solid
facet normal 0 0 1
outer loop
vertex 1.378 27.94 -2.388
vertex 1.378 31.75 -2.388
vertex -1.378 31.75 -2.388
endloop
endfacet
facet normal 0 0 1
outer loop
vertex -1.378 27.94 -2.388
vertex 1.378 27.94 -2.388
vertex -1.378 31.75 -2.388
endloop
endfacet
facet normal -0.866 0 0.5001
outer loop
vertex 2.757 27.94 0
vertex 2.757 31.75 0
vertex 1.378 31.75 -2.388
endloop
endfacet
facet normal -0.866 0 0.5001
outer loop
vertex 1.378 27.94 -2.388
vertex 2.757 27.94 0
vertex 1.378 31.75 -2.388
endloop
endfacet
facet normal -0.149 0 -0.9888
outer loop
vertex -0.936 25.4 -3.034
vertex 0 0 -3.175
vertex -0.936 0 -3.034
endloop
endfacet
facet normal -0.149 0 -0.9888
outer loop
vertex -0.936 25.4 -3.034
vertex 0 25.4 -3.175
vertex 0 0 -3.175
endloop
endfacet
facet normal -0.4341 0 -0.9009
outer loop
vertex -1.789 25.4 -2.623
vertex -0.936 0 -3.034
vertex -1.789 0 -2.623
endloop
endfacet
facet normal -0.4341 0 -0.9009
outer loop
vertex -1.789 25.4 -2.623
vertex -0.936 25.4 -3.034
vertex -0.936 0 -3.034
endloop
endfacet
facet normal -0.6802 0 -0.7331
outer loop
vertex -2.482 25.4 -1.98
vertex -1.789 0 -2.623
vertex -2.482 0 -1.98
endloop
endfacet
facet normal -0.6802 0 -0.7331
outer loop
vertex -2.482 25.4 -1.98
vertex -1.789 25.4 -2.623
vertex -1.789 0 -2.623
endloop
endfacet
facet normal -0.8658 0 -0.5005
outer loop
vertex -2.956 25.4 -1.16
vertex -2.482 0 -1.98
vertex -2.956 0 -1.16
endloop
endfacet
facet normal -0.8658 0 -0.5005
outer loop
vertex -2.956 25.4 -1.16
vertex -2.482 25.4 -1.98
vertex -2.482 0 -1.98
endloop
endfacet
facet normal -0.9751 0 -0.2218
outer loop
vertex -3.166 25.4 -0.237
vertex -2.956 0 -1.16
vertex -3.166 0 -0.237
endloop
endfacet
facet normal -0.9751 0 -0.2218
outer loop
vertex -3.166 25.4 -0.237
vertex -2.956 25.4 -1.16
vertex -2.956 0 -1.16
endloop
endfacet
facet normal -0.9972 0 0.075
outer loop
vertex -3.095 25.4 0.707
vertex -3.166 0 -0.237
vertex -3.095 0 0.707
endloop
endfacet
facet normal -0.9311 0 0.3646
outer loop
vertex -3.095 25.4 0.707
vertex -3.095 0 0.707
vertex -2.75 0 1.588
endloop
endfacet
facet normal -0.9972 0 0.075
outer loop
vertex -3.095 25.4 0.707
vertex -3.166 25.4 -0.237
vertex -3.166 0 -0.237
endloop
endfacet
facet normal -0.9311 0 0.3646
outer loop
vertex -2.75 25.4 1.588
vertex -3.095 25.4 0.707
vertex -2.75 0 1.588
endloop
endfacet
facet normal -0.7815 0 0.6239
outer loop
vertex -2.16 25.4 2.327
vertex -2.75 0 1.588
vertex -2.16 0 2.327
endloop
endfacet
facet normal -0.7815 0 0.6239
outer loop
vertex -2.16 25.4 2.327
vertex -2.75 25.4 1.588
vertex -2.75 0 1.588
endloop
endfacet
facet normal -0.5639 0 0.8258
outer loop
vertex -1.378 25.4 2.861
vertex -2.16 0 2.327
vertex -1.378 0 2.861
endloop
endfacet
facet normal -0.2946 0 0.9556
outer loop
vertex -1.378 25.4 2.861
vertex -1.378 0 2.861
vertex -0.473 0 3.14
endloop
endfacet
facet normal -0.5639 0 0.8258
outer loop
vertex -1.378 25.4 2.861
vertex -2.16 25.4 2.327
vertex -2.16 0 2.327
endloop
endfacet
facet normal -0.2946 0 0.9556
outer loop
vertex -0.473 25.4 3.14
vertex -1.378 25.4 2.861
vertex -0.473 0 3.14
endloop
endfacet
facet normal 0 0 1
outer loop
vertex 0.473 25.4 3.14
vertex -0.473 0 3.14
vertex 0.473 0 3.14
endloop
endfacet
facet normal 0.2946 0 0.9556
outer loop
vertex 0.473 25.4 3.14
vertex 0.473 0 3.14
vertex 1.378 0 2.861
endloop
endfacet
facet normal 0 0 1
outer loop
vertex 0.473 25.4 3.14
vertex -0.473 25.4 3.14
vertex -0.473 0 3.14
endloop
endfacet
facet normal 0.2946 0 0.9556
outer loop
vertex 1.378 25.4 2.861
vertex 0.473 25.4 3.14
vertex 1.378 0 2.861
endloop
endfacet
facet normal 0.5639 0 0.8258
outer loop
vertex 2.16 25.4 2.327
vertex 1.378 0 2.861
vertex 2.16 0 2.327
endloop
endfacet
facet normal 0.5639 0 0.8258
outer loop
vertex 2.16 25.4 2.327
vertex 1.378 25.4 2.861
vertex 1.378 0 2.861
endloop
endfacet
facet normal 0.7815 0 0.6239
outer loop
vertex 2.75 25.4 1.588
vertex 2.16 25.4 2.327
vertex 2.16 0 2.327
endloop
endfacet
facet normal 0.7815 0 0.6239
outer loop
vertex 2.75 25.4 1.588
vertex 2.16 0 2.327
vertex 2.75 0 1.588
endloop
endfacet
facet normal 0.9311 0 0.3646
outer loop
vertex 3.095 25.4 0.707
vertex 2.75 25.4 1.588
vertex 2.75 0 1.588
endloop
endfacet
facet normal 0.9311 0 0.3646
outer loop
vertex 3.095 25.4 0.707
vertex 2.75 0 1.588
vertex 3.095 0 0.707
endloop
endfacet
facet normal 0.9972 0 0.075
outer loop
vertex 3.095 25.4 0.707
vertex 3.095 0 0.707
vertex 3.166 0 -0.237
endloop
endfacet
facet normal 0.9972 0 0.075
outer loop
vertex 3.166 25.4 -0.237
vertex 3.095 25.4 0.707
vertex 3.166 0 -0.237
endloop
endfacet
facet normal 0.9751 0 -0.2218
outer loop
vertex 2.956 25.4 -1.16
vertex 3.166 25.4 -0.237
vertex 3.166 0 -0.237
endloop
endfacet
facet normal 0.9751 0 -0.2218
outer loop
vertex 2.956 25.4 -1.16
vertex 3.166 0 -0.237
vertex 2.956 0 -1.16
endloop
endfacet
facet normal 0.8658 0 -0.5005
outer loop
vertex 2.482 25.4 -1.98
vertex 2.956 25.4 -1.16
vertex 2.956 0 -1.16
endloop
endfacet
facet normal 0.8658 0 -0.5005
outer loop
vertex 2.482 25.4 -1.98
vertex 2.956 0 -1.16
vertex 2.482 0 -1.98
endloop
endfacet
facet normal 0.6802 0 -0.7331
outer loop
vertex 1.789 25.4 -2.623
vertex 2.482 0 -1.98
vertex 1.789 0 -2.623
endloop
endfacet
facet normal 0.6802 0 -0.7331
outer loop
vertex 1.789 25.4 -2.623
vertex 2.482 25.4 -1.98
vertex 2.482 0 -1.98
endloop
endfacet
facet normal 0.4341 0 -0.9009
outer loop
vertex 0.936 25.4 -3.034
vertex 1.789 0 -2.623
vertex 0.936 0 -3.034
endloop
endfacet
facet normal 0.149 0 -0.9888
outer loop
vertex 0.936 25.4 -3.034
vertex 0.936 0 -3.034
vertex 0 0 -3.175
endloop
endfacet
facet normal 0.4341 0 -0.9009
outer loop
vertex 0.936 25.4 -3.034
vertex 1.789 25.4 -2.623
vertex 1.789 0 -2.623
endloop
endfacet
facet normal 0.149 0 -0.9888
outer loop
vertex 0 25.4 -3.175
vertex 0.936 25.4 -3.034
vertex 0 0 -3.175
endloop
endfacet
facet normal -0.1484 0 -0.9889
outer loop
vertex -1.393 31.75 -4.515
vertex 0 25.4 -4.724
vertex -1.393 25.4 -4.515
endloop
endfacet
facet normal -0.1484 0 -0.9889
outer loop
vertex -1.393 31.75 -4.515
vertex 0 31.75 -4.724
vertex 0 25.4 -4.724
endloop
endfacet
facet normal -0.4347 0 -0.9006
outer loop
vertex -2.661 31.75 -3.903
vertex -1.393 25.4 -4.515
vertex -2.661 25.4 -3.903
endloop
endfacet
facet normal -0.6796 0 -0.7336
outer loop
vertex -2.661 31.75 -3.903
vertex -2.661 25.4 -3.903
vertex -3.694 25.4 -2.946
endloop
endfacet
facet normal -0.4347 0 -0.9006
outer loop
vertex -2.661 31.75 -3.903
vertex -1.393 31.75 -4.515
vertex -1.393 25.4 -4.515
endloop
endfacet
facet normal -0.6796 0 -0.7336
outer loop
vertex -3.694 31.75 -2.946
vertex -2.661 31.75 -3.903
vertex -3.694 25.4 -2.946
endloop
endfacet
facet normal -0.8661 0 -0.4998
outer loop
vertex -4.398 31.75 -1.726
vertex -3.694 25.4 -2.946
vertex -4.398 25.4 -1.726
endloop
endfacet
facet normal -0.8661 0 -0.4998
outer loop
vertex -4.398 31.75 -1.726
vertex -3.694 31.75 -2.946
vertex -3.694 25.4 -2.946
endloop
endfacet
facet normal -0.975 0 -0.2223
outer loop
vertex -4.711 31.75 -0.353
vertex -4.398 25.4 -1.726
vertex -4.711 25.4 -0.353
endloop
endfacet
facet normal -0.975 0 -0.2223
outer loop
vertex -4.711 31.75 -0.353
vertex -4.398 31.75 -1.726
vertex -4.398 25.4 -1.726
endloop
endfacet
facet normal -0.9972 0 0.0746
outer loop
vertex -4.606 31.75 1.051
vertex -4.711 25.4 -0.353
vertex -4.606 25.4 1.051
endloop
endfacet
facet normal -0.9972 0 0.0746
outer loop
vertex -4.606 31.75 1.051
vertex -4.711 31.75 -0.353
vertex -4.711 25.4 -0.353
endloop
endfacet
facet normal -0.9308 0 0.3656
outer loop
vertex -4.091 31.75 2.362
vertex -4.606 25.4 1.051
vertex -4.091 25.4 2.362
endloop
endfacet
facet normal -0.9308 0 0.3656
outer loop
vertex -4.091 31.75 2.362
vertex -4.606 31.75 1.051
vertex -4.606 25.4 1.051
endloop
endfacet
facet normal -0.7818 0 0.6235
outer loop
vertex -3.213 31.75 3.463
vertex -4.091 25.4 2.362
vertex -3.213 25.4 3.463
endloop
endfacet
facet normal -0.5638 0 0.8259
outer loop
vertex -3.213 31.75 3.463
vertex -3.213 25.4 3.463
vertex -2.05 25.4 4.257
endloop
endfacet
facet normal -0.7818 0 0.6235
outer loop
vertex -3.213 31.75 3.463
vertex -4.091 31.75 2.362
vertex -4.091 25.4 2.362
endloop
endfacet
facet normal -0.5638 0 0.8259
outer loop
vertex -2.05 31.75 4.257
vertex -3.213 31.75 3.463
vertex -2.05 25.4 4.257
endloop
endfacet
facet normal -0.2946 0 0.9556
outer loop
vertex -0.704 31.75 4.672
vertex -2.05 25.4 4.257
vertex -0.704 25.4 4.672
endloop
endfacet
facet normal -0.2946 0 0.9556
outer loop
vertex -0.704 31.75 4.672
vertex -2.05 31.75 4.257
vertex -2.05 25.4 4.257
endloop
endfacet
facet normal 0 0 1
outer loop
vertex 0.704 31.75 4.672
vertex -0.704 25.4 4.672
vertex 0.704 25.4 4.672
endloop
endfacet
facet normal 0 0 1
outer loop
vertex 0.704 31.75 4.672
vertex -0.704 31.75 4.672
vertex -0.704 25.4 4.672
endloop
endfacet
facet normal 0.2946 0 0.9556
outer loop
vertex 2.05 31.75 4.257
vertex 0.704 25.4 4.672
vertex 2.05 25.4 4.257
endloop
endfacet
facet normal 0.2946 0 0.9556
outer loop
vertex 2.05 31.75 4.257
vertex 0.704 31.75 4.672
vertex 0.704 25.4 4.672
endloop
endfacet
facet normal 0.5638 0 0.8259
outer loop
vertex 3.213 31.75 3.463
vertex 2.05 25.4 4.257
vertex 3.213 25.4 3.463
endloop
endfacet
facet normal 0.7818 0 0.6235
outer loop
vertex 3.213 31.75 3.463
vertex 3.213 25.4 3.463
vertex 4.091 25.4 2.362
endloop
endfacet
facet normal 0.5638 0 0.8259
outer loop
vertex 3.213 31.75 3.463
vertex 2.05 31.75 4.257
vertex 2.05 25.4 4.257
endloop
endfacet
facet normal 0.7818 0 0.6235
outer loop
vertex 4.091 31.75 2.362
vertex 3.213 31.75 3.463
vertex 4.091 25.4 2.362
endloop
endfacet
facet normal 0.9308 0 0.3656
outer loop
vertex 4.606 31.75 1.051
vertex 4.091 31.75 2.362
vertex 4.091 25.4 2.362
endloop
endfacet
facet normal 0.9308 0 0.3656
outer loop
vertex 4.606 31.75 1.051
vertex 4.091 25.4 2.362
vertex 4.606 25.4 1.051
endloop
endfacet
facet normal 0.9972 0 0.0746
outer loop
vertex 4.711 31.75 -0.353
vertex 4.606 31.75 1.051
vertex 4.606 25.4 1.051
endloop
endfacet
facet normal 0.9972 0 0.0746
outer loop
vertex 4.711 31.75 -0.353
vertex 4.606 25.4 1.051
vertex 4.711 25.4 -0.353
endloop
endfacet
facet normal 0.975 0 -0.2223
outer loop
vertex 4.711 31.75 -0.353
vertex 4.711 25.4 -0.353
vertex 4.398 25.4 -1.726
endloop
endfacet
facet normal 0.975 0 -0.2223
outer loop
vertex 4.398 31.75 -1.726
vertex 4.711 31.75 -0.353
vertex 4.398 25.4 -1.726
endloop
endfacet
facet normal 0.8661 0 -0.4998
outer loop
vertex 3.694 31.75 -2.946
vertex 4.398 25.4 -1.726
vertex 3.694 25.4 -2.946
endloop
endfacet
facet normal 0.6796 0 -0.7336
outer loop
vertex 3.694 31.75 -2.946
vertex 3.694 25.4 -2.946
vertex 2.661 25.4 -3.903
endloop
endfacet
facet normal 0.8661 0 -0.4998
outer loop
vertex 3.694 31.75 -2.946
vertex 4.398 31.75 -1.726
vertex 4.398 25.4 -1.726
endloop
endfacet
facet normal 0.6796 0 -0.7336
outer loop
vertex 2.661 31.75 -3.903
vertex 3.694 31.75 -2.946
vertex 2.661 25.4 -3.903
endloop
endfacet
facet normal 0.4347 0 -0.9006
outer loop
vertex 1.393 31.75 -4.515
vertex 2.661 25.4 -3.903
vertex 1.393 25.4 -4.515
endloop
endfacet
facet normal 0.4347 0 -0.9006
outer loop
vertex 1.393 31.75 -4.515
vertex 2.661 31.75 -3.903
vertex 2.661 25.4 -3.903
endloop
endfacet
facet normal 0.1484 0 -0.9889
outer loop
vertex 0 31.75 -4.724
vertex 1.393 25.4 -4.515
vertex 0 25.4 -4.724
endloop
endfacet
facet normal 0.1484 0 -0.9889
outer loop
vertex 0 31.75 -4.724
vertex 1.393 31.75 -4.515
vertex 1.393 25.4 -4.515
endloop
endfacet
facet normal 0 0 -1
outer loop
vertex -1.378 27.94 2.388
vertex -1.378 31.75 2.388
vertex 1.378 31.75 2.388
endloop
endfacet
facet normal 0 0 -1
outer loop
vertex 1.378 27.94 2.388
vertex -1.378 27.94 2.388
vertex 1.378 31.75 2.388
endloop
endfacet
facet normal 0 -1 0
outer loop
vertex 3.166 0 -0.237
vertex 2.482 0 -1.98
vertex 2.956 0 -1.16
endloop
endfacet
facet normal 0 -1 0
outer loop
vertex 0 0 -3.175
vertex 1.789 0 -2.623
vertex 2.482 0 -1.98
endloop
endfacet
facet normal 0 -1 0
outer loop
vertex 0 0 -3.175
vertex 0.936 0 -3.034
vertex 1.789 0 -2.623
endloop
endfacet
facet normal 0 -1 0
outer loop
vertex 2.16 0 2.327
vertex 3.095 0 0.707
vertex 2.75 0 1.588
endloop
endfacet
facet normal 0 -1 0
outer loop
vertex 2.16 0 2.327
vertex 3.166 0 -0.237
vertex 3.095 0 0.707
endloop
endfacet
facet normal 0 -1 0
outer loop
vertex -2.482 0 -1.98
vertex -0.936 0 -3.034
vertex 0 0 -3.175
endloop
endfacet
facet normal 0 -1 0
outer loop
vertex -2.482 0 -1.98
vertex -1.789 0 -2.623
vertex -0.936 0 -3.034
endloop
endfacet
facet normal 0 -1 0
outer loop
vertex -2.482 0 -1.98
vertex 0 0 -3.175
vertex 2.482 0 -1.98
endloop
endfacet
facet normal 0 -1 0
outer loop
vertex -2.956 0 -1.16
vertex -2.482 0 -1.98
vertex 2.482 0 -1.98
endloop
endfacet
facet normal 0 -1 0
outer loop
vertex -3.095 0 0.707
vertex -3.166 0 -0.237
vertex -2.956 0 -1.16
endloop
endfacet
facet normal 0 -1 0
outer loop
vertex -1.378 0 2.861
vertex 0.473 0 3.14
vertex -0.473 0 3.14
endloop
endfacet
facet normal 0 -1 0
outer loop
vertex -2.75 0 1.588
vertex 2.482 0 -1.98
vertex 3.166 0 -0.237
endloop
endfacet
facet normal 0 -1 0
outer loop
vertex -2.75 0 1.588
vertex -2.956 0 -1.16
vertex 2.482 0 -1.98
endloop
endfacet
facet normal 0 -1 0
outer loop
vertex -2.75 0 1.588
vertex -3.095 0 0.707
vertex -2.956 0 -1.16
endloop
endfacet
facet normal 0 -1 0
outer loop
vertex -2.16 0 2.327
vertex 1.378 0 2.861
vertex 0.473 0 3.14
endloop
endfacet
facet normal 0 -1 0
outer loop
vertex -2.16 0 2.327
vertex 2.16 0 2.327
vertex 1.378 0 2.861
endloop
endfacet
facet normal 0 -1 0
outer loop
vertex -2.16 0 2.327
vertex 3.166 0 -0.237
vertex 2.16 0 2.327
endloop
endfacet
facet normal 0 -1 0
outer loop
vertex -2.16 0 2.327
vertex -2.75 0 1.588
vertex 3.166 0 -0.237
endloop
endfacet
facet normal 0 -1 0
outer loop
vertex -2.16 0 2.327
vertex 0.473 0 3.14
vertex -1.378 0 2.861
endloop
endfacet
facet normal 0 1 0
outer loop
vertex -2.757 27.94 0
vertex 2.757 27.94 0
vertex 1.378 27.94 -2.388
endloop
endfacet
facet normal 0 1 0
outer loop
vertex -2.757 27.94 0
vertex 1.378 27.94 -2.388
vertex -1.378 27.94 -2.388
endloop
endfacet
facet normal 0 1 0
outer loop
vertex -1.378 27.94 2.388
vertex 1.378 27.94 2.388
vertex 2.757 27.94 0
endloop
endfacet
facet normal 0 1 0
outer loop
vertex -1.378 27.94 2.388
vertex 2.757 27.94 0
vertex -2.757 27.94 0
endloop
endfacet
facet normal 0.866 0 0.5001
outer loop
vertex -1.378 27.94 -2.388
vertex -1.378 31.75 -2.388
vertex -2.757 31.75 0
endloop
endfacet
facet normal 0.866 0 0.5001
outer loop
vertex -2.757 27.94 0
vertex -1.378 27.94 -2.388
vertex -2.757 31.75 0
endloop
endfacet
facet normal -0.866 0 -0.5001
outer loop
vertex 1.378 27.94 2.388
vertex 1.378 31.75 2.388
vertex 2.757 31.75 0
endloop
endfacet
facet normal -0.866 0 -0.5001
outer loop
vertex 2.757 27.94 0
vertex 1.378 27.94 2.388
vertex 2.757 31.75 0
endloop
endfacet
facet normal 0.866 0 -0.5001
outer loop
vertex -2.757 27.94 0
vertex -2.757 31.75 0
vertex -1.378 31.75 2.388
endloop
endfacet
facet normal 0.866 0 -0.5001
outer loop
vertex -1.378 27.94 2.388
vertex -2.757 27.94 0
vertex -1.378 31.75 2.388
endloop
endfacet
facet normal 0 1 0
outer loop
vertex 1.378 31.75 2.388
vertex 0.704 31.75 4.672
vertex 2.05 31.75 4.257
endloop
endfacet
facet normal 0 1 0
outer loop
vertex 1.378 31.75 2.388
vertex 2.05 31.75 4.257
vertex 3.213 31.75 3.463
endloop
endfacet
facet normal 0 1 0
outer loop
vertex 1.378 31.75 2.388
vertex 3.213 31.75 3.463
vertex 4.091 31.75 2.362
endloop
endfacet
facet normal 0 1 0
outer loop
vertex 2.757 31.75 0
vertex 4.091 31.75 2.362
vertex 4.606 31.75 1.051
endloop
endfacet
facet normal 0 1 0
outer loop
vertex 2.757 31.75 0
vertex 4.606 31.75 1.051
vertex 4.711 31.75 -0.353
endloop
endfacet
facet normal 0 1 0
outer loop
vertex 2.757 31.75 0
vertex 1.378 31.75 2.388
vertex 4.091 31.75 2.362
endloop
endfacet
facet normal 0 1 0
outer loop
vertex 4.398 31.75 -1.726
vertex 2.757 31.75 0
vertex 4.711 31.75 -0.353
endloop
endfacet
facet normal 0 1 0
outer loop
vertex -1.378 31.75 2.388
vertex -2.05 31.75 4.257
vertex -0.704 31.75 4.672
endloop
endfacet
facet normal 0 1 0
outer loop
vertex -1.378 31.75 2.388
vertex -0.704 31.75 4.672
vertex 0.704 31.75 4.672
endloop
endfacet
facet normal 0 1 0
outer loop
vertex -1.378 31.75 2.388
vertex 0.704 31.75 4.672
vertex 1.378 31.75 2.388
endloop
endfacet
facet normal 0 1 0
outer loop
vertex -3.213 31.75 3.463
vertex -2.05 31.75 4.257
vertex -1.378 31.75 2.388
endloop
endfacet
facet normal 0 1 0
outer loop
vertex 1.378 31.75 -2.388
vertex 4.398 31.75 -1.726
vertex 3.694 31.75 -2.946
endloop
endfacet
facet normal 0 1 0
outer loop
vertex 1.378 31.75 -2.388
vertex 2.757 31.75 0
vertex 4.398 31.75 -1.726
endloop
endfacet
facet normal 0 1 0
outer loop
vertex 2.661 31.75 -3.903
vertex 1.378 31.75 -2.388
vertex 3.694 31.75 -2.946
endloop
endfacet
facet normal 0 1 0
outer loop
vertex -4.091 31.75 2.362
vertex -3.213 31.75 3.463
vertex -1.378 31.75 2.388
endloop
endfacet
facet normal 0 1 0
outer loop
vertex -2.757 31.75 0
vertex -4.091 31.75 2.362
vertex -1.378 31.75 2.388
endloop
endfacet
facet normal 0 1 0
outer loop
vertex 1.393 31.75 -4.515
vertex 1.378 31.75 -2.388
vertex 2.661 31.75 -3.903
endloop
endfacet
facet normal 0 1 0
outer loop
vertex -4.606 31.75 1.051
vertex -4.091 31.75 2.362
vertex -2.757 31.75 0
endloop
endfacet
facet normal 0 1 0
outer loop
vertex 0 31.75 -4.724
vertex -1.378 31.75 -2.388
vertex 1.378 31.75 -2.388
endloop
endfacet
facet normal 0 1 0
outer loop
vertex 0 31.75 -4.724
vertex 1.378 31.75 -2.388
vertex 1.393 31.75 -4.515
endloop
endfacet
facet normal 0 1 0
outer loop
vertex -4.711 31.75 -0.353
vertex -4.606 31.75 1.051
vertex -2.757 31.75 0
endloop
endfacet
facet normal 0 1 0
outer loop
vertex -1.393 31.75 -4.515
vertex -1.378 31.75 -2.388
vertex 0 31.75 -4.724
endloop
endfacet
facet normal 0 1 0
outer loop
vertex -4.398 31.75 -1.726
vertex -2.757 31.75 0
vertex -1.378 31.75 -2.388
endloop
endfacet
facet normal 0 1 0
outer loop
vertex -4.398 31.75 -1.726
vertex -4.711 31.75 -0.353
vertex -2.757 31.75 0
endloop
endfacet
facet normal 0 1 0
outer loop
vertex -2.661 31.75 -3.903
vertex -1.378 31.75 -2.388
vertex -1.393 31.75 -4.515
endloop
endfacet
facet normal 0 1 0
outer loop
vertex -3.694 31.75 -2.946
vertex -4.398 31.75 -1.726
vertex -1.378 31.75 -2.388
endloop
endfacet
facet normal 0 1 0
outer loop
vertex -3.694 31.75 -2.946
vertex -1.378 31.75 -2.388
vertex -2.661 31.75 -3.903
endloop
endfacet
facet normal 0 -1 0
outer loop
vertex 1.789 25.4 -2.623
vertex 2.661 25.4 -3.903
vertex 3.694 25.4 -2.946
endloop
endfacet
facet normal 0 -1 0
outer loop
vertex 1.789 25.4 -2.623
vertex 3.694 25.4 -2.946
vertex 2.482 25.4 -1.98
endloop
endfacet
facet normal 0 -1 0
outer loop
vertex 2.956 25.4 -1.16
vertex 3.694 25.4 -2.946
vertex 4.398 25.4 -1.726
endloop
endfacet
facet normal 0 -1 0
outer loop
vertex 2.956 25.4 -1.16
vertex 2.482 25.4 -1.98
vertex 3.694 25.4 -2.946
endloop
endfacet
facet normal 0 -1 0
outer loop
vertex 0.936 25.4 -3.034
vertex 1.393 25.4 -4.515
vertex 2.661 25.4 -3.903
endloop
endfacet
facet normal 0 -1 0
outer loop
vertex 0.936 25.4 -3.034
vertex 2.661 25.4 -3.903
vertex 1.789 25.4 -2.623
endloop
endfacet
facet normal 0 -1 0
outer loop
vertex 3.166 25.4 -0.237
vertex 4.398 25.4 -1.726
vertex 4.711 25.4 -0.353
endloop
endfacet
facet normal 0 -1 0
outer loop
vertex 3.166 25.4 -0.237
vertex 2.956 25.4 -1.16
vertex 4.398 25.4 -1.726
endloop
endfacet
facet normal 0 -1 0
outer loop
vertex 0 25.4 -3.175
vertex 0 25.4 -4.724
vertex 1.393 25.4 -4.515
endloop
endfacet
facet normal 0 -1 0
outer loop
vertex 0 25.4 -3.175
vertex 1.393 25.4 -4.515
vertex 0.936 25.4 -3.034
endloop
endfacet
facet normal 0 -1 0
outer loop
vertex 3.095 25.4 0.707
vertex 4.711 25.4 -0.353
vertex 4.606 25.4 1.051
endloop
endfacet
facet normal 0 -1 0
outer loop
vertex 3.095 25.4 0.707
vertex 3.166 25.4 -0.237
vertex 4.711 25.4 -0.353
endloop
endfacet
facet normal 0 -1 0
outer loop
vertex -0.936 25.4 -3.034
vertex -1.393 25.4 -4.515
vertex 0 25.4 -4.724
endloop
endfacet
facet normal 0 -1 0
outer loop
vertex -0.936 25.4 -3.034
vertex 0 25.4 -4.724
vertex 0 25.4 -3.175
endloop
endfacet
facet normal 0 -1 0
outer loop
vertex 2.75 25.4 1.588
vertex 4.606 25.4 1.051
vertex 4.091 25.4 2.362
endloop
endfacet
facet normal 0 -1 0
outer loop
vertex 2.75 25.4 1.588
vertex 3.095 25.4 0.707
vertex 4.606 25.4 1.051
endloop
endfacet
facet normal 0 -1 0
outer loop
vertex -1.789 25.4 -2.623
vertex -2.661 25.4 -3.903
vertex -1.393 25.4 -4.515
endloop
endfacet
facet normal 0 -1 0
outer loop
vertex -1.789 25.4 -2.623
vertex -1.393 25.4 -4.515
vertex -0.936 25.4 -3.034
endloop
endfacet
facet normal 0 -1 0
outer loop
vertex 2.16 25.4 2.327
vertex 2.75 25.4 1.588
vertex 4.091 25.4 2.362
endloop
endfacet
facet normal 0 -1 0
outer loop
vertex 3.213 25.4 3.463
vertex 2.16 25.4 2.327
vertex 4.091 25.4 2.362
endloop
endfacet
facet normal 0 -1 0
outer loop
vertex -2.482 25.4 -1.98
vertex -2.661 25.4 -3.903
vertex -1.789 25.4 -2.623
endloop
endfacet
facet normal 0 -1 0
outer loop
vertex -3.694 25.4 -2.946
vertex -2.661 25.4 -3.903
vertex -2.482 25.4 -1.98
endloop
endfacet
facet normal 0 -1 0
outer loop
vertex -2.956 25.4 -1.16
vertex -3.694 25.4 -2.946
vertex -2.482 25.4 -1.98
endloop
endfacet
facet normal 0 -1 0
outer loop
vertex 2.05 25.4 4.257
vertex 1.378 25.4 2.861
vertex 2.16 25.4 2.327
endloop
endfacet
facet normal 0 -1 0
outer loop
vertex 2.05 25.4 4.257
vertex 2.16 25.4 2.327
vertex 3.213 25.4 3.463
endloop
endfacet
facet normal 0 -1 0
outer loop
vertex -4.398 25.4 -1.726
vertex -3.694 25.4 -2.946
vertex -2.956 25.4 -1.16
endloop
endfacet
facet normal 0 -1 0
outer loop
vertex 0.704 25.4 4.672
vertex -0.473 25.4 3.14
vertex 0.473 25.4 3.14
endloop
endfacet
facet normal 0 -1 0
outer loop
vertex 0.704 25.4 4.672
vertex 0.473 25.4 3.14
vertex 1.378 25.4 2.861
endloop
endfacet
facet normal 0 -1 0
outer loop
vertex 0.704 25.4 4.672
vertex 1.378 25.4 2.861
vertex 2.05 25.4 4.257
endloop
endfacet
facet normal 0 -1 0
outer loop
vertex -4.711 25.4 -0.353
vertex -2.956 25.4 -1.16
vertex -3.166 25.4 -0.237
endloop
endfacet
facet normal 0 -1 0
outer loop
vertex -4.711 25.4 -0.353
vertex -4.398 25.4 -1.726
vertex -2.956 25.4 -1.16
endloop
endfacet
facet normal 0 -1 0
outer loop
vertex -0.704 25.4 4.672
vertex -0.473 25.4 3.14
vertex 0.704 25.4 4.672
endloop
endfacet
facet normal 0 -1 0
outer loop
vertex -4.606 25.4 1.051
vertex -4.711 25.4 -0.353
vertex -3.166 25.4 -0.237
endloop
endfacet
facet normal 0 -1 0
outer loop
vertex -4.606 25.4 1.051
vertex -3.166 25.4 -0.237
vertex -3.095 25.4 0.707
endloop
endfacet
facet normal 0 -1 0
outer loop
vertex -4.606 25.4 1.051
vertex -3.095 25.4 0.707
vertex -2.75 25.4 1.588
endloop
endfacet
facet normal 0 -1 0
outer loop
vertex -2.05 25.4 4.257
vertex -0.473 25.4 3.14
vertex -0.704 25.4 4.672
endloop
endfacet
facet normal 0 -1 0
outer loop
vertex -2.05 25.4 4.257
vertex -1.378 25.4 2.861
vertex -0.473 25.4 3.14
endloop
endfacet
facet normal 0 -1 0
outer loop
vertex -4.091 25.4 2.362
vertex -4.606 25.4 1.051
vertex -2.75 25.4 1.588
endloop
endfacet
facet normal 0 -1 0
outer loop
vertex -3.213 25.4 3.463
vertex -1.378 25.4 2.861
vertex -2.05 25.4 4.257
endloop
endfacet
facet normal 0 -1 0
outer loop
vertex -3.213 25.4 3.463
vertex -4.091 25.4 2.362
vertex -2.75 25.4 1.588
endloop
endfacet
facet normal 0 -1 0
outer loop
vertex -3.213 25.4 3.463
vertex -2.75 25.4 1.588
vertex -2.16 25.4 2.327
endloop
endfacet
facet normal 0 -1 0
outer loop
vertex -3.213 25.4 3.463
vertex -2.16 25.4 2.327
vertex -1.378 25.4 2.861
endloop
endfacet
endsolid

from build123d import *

# Parameters (mm, degrees)
HEX_CUT_DEPTH = 3.81


with BuildPart() as part:
    # Sketch1 → Screw revolve (revolve)
    with BuildSketch(Plane.XY, mode=Mode.PRIVATE) as screw_revolve_sk:
        Polygon((0, 0), (3.175, 0), (3.175, 25.4), (4.7244, 25.4), (4.7244, 31.75), (0, 31.75), align=None)
    revolve(screw_revolve_sk.sketch.rotate(Axis((0, 0, 0), (0, 1, 0)), 90), axis=Axis((0, 0, 0), (0, 1, 0)))

    # Sketch2 → Hex Cut (cut)
    with BuildSketch(Plane(origin=(0, 31.75, 0), x_dir=(-1, 0, 0), z_dir=(0, 1, 0))):
        Polygon((-2.756963005, 0), (-1.378481503, -2.3876), (1.378481503, -2.3876), (2.756963005, 0), (1.378481503, 2.3876), (-1.378481503, 2.3876), align=None)
    extrude(amount=-HEX_CUT_DEPTH, mode=Mode.SUBTRACT)


solid = part.part
